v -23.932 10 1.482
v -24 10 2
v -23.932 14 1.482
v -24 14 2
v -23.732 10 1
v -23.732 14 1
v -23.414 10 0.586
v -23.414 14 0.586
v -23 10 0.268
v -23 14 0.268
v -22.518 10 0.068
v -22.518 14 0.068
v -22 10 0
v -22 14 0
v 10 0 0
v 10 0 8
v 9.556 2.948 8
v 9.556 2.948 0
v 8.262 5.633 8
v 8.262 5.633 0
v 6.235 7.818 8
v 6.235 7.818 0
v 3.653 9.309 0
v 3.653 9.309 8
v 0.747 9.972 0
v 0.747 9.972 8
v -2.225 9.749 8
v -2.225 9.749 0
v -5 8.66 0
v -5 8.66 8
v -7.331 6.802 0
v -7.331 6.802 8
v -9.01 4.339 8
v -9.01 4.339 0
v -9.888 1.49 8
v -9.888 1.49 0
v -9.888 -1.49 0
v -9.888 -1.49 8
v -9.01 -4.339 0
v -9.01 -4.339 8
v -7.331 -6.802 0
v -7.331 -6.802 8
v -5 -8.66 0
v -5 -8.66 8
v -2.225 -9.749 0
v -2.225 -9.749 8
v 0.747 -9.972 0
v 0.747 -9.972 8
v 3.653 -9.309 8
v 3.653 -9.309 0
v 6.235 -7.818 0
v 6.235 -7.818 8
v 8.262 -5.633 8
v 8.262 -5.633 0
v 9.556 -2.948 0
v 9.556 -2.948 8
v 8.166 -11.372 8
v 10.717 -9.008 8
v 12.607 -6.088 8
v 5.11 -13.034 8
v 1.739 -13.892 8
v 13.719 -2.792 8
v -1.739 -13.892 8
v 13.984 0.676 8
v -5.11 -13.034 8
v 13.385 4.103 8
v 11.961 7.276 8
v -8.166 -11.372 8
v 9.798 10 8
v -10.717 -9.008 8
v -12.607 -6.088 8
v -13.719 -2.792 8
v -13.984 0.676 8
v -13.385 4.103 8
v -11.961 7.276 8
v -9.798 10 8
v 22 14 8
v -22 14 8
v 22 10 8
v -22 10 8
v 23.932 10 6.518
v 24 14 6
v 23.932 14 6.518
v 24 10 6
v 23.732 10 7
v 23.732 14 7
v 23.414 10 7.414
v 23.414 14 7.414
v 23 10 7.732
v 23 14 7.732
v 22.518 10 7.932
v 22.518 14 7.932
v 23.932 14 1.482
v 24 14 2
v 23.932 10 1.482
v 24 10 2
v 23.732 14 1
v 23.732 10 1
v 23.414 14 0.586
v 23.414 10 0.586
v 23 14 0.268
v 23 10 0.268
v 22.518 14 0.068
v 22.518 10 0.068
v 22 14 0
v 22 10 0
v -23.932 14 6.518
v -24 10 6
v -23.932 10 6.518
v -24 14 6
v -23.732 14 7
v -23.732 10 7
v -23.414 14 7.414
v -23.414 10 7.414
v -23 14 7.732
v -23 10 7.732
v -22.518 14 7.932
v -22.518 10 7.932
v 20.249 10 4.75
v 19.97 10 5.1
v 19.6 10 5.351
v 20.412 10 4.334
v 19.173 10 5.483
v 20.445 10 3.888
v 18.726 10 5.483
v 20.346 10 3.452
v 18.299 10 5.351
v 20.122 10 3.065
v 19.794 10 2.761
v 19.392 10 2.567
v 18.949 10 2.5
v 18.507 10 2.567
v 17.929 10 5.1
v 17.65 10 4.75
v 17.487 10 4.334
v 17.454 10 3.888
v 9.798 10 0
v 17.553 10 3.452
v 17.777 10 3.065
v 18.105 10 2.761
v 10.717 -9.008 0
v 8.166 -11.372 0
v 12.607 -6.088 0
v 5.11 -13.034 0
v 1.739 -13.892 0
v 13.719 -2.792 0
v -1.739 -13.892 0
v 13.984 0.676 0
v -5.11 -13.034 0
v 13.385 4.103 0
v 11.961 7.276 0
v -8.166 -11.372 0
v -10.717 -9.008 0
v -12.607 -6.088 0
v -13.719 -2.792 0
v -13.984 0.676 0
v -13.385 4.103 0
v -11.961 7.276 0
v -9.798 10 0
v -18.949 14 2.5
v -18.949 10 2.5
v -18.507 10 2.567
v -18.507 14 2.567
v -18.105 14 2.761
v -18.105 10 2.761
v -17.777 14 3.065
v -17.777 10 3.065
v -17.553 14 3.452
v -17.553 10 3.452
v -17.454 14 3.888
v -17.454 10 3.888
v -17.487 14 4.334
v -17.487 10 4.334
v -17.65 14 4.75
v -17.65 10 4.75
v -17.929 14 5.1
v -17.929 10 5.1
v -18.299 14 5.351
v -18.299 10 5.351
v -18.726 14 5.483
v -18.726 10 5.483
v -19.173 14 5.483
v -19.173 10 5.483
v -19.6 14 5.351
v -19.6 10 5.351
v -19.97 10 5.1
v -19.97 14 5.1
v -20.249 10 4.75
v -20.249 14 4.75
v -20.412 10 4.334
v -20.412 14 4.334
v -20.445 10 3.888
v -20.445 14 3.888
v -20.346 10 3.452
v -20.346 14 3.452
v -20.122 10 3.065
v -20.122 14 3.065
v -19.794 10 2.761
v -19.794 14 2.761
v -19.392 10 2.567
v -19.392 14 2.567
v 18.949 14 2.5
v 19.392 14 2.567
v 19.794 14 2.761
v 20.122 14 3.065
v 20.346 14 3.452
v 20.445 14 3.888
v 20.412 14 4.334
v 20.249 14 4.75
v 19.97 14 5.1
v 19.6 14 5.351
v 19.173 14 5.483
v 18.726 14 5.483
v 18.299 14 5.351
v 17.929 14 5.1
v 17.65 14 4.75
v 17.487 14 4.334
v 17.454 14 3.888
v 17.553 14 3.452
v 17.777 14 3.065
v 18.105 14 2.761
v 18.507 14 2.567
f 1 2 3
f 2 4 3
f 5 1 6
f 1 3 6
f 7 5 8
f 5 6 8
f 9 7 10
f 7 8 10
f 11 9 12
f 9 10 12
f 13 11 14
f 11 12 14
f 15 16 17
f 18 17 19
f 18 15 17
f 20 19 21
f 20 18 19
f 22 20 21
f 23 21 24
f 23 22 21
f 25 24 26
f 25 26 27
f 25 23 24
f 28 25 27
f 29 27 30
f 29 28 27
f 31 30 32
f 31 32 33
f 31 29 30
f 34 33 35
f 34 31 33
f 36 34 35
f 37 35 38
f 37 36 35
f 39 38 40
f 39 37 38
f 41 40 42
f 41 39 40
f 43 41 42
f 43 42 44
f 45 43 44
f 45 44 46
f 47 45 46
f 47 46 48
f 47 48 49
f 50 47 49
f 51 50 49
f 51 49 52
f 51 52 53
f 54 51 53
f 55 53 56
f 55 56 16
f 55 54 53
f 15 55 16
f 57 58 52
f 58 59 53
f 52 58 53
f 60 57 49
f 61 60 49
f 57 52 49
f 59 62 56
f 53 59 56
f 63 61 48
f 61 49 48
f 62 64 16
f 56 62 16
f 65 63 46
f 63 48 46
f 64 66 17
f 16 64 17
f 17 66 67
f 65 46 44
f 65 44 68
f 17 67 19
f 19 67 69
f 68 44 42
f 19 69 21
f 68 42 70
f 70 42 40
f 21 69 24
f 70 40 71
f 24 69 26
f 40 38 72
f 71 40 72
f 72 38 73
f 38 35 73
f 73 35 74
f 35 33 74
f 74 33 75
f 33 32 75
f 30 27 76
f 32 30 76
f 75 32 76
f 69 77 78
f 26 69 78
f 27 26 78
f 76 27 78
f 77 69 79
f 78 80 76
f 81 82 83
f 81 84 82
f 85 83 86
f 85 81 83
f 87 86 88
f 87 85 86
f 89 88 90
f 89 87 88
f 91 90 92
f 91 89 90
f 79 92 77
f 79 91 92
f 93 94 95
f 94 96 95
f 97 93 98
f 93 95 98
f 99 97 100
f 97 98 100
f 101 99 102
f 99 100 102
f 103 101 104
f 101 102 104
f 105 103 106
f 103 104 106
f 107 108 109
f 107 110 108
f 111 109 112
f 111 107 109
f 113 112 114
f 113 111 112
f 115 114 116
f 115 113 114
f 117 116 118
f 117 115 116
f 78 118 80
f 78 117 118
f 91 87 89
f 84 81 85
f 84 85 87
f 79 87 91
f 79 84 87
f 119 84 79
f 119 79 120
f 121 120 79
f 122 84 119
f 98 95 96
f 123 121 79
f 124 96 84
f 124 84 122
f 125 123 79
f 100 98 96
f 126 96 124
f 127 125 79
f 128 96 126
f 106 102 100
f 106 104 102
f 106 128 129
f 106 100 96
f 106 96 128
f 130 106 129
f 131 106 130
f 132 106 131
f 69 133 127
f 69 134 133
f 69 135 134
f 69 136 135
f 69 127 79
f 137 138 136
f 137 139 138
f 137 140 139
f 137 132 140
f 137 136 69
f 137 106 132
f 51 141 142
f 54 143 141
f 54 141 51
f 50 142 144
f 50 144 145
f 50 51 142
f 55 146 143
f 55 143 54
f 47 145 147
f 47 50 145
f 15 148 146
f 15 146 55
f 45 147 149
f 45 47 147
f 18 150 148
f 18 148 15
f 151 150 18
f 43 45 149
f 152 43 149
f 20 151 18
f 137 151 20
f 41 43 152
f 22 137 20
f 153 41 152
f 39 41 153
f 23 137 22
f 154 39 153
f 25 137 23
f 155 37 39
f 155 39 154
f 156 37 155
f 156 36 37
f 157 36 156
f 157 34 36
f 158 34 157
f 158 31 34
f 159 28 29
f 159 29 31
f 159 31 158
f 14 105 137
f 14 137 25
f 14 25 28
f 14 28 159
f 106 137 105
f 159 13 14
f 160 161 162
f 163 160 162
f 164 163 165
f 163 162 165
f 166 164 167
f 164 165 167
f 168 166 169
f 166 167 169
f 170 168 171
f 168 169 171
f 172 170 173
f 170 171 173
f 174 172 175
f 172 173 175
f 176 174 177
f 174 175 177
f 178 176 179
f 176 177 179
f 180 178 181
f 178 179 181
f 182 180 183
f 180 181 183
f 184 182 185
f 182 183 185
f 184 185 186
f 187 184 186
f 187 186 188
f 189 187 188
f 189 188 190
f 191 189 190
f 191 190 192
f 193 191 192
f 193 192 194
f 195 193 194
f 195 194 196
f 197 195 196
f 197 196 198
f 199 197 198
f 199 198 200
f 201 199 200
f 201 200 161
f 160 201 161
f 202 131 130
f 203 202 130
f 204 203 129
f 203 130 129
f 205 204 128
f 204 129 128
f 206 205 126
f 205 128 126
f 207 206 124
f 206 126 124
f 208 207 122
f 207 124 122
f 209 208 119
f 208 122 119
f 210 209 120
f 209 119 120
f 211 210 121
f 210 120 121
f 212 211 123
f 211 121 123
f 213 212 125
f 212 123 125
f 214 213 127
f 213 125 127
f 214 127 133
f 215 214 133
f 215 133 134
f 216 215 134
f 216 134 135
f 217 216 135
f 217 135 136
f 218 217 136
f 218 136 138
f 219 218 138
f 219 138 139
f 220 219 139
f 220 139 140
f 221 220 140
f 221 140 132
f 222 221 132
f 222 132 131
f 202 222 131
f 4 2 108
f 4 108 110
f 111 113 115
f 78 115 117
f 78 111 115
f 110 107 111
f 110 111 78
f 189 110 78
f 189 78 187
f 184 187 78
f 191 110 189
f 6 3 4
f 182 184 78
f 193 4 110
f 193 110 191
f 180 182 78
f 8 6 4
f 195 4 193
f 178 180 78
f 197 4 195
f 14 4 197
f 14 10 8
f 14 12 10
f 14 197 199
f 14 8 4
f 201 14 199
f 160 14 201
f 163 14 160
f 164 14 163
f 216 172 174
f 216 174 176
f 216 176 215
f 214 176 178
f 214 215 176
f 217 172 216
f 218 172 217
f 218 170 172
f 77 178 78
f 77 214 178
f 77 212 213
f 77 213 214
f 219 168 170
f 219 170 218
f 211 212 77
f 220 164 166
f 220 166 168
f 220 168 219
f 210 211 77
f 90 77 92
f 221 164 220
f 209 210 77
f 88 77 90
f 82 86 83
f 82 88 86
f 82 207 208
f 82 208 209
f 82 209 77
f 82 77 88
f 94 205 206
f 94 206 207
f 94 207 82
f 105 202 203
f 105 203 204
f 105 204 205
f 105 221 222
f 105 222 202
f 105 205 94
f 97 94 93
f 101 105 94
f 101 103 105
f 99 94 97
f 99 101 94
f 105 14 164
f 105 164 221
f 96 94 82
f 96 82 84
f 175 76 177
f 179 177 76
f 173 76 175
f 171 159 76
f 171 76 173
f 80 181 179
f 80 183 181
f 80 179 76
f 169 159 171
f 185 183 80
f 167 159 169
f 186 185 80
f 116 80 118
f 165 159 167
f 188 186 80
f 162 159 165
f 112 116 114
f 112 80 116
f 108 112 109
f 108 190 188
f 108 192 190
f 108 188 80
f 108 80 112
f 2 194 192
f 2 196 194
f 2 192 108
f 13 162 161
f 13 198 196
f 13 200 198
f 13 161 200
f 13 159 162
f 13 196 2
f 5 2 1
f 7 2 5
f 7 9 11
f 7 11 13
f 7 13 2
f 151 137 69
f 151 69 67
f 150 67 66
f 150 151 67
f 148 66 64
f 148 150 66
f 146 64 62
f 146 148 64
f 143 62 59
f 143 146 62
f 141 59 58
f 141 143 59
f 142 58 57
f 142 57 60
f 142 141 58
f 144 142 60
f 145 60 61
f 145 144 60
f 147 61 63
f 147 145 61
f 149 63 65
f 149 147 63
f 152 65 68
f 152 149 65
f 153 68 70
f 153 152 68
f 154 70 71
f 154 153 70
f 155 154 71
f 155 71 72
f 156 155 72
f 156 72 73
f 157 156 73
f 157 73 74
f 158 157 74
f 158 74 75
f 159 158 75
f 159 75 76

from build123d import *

# Parameters (mm, degrees)
CROQUIS1_R              = 10
SALIENTE_EXTRUIR1_DEPTH = 8
REDONDEO1_R             = 2
CROQUIS2_R              = 1.5
CORTAR_EXTRUIR1_DEPTH   = 35.871191548


with BuildPart() as part:
    # Croquis1 → Saliente-Extruir1 (new body)
    with BuildSketch(Plane.XY):
        with BuildLine():
            Line((0, 14), (24, 14))
            Line((24, 14), (24, 10))
            Line((24, 10), (9.797958971, 10))
            ThreePointArc((9.797958971, 10), (0, -14), (-9.797958971, 10))
            Line((-9.797958971, 10), (-24, 10))
            Line((-24, 10), (-24, 14))
            Line((-24, 14), (0, 14))
        make_face()
        Circle(CROQUIS1_R, mode=Mode.SUBTRACT)
    extrude(amount=SALIENTE_EXTRUIR1_DEPTH)

    # Redondeo1
    redondeo1_edges = [part.edges().sort_by_distance(p)[0] for p in [
        (24, 12, 8),
        (-24, 12, 8),
        (-24, 12, 0),
        (24, 12, 0),
    ]]
    fillet(redondeo1_edges, radius=REDONDEO1_R)

    # Croquis2 → Cortar-Extruir1 (cut, through all)
    with BuildSketch(Plane.XZ.offset(-10)):
        with Locations(Location((-18.949489743, 4, 0), (0, 0, 270))):
            Circle(CROQUIS2_R)
        with Locations(Location((18.949489743, 4, 0), (0, 0, 270))):
            Circle(CROQUIS2_R)
    extrude(amount=-CORTAR_EXTRUIR1_DEPTH, mode=Mode.SUBTRACT)


solid = part.part
